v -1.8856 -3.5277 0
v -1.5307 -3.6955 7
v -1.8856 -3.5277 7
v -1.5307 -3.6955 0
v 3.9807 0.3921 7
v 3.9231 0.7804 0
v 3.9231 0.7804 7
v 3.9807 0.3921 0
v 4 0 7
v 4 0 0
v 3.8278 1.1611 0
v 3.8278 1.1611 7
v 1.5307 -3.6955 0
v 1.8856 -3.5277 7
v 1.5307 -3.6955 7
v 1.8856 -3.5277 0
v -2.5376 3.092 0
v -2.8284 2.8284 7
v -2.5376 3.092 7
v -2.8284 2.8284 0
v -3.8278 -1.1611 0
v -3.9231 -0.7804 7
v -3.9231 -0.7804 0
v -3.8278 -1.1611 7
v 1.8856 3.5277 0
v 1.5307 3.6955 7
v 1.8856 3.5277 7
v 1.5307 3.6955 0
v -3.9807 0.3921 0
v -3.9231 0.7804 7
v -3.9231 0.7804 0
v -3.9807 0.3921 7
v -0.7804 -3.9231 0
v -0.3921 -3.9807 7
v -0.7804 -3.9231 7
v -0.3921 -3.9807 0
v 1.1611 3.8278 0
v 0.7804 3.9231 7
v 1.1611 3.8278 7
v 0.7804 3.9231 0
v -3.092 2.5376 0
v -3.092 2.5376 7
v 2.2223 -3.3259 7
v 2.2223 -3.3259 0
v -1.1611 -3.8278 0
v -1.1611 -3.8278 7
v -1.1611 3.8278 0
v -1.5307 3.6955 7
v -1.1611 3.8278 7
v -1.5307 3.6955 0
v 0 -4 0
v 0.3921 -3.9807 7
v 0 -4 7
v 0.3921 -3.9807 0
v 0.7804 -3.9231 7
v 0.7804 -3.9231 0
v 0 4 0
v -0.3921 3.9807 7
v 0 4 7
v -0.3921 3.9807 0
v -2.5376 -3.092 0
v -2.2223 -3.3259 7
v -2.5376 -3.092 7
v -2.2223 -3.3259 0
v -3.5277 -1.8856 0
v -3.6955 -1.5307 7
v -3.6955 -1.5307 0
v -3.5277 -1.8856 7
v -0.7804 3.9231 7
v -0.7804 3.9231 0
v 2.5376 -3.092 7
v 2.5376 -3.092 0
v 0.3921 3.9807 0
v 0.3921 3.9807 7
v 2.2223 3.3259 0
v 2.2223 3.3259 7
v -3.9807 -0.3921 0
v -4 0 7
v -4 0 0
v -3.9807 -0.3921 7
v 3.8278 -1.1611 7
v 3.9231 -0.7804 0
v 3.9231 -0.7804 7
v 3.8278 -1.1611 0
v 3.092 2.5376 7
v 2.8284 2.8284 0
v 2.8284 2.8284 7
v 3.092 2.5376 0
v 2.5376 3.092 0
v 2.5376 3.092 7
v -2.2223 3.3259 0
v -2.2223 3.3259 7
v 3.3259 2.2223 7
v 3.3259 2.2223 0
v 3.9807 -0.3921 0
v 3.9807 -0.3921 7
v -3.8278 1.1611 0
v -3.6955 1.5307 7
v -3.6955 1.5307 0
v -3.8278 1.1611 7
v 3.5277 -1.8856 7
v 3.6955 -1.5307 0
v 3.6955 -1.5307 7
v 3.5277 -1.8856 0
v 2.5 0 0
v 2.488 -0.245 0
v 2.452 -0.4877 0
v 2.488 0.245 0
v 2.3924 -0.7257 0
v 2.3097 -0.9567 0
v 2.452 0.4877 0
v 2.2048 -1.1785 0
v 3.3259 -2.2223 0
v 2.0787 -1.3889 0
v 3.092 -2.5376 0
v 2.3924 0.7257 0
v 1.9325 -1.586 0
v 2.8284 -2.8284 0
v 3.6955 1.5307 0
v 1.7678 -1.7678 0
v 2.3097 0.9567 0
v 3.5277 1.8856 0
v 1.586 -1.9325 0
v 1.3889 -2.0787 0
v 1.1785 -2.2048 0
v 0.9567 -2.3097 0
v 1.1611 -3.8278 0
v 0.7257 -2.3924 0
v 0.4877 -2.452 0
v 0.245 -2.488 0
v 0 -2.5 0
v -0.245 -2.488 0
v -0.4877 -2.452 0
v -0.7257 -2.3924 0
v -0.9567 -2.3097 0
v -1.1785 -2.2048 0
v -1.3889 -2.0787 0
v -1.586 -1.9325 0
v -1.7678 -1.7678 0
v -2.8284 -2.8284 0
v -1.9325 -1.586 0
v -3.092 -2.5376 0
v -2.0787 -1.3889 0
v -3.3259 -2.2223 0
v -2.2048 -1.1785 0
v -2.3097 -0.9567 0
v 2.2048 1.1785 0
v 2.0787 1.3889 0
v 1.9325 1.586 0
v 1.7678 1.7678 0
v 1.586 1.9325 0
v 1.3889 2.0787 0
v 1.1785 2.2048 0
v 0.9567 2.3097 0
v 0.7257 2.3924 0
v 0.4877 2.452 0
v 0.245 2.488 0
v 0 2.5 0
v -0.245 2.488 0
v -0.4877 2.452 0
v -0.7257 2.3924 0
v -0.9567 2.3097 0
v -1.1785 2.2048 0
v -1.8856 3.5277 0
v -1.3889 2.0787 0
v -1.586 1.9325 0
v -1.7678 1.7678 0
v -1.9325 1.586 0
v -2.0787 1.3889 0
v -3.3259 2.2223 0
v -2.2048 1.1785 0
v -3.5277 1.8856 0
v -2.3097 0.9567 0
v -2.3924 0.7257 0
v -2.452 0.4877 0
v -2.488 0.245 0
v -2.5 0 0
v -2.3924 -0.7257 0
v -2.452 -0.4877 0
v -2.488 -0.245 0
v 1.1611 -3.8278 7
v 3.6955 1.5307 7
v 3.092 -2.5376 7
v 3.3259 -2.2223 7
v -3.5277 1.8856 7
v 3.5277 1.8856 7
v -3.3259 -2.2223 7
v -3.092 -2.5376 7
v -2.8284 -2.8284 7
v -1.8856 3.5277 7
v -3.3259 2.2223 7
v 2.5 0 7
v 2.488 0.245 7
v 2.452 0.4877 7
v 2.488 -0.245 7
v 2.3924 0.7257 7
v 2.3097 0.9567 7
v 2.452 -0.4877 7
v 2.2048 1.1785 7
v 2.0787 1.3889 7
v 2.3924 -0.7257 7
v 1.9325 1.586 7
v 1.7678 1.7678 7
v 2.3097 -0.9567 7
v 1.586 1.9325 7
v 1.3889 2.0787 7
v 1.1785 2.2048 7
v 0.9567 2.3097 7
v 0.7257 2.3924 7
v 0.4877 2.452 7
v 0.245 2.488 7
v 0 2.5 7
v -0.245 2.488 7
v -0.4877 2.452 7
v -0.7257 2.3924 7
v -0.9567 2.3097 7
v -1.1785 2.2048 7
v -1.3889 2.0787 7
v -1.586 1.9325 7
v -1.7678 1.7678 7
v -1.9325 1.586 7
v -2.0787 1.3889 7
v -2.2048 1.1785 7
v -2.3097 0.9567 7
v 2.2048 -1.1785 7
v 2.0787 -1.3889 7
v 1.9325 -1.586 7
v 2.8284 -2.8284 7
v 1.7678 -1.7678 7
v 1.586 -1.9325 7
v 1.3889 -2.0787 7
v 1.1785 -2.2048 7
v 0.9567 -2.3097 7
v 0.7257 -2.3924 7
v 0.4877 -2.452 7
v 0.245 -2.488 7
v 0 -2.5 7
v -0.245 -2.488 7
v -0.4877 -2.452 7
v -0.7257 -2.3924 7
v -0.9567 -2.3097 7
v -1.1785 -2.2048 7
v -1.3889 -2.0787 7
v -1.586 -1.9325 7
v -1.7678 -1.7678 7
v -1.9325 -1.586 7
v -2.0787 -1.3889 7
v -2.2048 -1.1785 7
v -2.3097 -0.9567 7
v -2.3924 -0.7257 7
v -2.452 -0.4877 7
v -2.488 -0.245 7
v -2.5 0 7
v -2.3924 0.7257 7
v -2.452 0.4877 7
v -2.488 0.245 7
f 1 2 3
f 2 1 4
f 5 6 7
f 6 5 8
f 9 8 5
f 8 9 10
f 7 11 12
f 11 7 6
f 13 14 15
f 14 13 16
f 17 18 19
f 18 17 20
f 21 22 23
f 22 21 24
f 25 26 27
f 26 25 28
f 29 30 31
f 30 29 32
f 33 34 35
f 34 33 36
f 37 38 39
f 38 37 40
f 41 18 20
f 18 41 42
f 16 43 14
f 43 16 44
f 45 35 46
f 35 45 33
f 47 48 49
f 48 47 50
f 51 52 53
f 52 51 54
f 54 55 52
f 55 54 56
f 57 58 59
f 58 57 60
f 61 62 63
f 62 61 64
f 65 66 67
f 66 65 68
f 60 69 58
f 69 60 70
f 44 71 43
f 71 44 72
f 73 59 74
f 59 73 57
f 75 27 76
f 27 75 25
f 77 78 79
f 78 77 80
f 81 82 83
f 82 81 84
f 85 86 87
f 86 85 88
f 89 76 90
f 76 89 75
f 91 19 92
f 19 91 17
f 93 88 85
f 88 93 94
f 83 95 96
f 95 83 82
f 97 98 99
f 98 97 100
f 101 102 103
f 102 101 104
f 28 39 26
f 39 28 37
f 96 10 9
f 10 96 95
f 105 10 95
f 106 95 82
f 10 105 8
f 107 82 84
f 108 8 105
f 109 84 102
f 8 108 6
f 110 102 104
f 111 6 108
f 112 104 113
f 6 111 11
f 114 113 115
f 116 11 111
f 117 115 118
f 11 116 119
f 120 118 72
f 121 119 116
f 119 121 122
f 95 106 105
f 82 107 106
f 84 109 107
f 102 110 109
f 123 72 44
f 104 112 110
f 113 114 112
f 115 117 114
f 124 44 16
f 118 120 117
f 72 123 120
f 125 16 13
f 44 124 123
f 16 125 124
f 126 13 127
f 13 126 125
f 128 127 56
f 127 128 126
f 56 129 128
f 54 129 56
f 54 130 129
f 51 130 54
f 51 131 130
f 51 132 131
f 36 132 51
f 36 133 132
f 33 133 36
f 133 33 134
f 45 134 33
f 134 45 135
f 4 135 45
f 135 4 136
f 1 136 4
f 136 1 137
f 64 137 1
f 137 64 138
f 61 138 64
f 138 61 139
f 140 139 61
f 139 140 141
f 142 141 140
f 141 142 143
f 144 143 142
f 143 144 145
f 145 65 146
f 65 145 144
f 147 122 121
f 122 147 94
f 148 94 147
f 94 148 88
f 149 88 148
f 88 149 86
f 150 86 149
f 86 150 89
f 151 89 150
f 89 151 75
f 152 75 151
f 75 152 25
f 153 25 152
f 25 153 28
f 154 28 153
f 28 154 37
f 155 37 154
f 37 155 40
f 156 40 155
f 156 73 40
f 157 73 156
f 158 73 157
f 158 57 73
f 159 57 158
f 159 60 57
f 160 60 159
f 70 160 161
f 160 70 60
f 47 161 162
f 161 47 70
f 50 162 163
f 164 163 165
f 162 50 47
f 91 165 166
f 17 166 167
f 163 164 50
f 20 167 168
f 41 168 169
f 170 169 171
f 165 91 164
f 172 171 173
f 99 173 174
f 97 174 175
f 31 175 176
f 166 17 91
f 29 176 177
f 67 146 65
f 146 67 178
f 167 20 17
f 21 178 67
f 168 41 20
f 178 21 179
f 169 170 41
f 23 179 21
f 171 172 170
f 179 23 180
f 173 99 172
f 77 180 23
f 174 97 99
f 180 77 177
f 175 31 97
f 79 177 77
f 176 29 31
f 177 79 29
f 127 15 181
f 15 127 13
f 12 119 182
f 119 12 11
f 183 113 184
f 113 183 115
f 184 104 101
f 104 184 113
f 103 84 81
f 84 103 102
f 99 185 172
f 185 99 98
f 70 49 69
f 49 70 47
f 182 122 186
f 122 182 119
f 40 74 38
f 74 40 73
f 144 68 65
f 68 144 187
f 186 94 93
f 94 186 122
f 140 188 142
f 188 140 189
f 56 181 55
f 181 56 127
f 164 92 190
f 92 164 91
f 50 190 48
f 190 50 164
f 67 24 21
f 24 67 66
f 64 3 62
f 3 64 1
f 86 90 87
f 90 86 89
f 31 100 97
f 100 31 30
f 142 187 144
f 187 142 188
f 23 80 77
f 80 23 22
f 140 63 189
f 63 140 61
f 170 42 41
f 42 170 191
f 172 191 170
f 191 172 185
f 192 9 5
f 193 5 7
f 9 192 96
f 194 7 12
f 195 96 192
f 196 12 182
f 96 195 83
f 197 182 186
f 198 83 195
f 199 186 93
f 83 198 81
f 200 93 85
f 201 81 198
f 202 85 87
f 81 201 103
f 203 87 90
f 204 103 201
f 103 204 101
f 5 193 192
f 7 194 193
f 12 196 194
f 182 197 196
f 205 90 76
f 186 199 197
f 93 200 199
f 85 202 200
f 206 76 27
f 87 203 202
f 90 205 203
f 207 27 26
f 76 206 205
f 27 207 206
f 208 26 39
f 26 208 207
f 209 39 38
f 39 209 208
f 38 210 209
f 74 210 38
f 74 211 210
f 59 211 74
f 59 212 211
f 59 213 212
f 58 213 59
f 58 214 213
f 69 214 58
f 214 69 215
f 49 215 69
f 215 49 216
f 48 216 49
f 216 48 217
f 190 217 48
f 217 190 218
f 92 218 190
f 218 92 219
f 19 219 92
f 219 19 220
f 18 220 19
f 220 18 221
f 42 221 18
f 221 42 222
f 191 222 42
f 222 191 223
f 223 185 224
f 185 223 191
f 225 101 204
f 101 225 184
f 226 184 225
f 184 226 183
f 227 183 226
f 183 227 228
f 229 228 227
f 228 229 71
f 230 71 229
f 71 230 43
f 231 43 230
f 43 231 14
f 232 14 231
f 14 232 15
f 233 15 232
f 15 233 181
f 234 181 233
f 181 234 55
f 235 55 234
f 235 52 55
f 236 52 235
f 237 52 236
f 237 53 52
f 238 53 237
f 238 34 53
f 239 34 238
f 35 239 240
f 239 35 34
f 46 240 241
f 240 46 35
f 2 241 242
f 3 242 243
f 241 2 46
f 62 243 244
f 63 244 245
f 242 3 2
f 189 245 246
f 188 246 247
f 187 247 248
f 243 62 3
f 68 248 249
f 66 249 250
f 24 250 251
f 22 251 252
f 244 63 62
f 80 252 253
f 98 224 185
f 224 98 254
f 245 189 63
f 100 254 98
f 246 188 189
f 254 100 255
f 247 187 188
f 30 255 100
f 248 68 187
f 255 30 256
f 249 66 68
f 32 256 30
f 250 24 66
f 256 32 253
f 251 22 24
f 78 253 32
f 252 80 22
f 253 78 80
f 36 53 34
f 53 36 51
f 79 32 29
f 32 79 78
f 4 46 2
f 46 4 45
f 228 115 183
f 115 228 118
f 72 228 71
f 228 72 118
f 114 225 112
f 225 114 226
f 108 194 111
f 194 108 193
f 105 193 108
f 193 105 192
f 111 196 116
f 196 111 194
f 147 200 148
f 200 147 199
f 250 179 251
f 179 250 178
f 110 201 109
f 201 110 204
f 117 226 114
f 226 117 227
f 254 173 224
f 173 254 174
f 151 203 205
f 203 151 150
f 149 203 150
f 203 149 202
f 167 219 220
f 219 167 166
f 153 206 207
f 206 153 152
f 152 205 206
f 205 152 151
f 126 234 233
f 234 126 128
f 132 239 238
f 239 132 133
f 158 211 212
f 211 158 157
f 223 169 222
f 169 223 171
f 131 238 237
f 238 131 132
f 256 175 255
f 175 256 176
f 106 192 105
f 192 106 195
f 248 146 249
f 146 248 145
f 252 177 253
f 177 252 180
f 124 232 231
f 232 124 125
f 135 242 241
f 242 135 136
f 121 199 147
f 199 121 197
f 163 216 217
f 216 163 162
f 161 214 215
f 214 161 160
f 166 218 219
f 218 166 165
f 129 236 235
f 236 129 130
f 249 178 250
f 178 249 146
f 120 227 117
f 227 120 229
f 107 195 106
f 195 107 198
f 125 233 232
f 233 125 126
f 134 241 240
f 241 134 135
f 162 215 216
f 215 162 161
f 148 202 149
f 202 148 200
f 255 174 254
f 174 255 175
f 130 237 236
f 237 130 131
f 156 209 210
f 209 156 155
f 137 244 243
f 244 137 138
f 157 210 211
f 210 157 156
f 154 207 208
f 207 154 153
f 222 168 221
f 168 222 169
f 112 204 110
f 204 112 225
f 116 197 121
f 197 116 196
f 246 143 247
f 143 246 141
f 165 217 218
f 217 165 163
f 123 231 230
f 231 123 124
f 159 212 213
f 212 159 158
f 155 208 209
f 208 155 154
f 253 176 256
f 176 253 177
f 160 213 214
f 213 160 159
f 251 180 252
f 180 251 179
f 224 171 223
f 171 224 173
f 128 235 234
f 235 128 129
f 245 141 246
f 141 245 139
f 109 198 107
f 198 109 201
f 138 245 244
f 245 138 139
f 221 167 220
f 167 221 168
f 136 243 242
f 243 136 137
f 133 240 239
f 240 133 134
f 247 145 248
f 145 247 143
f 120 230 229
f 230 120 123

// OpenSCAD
$fn = 64;

hole_d = 4;
hole_r = hole_d / 2;
hole_spacing = 32;  // Distance center to center of holes on fan.
hole_delta = 4; // Distance center to edge of fan.

spacing = 8;
washer_d = 12;
washer_r = washer_d / 2;
th = 2;

spine_x = washer_d;
spine_y = washer_r + spacing * 2 + 4;  // 4 from mount hole to edge of fan.

cross_x = hole_d + spacing * 2;
cross_y = hole_d + (hole_delta - hole_r);

// cube([cross_x, cross_y, th]);
// translate([(cross_x - spine_x) / 2, 0, 0])
//   cube([spine_x, spine_y, th]);

bushing_od = 8;
bushing_id = 5; 
bushing_h = 7;

difference() {
  cylinder(d = bushing_od, h = bushing_h);
  translate([0, 0, -1])
    cylinder(d = bushing_id, h = bushing_h + 2);
}
